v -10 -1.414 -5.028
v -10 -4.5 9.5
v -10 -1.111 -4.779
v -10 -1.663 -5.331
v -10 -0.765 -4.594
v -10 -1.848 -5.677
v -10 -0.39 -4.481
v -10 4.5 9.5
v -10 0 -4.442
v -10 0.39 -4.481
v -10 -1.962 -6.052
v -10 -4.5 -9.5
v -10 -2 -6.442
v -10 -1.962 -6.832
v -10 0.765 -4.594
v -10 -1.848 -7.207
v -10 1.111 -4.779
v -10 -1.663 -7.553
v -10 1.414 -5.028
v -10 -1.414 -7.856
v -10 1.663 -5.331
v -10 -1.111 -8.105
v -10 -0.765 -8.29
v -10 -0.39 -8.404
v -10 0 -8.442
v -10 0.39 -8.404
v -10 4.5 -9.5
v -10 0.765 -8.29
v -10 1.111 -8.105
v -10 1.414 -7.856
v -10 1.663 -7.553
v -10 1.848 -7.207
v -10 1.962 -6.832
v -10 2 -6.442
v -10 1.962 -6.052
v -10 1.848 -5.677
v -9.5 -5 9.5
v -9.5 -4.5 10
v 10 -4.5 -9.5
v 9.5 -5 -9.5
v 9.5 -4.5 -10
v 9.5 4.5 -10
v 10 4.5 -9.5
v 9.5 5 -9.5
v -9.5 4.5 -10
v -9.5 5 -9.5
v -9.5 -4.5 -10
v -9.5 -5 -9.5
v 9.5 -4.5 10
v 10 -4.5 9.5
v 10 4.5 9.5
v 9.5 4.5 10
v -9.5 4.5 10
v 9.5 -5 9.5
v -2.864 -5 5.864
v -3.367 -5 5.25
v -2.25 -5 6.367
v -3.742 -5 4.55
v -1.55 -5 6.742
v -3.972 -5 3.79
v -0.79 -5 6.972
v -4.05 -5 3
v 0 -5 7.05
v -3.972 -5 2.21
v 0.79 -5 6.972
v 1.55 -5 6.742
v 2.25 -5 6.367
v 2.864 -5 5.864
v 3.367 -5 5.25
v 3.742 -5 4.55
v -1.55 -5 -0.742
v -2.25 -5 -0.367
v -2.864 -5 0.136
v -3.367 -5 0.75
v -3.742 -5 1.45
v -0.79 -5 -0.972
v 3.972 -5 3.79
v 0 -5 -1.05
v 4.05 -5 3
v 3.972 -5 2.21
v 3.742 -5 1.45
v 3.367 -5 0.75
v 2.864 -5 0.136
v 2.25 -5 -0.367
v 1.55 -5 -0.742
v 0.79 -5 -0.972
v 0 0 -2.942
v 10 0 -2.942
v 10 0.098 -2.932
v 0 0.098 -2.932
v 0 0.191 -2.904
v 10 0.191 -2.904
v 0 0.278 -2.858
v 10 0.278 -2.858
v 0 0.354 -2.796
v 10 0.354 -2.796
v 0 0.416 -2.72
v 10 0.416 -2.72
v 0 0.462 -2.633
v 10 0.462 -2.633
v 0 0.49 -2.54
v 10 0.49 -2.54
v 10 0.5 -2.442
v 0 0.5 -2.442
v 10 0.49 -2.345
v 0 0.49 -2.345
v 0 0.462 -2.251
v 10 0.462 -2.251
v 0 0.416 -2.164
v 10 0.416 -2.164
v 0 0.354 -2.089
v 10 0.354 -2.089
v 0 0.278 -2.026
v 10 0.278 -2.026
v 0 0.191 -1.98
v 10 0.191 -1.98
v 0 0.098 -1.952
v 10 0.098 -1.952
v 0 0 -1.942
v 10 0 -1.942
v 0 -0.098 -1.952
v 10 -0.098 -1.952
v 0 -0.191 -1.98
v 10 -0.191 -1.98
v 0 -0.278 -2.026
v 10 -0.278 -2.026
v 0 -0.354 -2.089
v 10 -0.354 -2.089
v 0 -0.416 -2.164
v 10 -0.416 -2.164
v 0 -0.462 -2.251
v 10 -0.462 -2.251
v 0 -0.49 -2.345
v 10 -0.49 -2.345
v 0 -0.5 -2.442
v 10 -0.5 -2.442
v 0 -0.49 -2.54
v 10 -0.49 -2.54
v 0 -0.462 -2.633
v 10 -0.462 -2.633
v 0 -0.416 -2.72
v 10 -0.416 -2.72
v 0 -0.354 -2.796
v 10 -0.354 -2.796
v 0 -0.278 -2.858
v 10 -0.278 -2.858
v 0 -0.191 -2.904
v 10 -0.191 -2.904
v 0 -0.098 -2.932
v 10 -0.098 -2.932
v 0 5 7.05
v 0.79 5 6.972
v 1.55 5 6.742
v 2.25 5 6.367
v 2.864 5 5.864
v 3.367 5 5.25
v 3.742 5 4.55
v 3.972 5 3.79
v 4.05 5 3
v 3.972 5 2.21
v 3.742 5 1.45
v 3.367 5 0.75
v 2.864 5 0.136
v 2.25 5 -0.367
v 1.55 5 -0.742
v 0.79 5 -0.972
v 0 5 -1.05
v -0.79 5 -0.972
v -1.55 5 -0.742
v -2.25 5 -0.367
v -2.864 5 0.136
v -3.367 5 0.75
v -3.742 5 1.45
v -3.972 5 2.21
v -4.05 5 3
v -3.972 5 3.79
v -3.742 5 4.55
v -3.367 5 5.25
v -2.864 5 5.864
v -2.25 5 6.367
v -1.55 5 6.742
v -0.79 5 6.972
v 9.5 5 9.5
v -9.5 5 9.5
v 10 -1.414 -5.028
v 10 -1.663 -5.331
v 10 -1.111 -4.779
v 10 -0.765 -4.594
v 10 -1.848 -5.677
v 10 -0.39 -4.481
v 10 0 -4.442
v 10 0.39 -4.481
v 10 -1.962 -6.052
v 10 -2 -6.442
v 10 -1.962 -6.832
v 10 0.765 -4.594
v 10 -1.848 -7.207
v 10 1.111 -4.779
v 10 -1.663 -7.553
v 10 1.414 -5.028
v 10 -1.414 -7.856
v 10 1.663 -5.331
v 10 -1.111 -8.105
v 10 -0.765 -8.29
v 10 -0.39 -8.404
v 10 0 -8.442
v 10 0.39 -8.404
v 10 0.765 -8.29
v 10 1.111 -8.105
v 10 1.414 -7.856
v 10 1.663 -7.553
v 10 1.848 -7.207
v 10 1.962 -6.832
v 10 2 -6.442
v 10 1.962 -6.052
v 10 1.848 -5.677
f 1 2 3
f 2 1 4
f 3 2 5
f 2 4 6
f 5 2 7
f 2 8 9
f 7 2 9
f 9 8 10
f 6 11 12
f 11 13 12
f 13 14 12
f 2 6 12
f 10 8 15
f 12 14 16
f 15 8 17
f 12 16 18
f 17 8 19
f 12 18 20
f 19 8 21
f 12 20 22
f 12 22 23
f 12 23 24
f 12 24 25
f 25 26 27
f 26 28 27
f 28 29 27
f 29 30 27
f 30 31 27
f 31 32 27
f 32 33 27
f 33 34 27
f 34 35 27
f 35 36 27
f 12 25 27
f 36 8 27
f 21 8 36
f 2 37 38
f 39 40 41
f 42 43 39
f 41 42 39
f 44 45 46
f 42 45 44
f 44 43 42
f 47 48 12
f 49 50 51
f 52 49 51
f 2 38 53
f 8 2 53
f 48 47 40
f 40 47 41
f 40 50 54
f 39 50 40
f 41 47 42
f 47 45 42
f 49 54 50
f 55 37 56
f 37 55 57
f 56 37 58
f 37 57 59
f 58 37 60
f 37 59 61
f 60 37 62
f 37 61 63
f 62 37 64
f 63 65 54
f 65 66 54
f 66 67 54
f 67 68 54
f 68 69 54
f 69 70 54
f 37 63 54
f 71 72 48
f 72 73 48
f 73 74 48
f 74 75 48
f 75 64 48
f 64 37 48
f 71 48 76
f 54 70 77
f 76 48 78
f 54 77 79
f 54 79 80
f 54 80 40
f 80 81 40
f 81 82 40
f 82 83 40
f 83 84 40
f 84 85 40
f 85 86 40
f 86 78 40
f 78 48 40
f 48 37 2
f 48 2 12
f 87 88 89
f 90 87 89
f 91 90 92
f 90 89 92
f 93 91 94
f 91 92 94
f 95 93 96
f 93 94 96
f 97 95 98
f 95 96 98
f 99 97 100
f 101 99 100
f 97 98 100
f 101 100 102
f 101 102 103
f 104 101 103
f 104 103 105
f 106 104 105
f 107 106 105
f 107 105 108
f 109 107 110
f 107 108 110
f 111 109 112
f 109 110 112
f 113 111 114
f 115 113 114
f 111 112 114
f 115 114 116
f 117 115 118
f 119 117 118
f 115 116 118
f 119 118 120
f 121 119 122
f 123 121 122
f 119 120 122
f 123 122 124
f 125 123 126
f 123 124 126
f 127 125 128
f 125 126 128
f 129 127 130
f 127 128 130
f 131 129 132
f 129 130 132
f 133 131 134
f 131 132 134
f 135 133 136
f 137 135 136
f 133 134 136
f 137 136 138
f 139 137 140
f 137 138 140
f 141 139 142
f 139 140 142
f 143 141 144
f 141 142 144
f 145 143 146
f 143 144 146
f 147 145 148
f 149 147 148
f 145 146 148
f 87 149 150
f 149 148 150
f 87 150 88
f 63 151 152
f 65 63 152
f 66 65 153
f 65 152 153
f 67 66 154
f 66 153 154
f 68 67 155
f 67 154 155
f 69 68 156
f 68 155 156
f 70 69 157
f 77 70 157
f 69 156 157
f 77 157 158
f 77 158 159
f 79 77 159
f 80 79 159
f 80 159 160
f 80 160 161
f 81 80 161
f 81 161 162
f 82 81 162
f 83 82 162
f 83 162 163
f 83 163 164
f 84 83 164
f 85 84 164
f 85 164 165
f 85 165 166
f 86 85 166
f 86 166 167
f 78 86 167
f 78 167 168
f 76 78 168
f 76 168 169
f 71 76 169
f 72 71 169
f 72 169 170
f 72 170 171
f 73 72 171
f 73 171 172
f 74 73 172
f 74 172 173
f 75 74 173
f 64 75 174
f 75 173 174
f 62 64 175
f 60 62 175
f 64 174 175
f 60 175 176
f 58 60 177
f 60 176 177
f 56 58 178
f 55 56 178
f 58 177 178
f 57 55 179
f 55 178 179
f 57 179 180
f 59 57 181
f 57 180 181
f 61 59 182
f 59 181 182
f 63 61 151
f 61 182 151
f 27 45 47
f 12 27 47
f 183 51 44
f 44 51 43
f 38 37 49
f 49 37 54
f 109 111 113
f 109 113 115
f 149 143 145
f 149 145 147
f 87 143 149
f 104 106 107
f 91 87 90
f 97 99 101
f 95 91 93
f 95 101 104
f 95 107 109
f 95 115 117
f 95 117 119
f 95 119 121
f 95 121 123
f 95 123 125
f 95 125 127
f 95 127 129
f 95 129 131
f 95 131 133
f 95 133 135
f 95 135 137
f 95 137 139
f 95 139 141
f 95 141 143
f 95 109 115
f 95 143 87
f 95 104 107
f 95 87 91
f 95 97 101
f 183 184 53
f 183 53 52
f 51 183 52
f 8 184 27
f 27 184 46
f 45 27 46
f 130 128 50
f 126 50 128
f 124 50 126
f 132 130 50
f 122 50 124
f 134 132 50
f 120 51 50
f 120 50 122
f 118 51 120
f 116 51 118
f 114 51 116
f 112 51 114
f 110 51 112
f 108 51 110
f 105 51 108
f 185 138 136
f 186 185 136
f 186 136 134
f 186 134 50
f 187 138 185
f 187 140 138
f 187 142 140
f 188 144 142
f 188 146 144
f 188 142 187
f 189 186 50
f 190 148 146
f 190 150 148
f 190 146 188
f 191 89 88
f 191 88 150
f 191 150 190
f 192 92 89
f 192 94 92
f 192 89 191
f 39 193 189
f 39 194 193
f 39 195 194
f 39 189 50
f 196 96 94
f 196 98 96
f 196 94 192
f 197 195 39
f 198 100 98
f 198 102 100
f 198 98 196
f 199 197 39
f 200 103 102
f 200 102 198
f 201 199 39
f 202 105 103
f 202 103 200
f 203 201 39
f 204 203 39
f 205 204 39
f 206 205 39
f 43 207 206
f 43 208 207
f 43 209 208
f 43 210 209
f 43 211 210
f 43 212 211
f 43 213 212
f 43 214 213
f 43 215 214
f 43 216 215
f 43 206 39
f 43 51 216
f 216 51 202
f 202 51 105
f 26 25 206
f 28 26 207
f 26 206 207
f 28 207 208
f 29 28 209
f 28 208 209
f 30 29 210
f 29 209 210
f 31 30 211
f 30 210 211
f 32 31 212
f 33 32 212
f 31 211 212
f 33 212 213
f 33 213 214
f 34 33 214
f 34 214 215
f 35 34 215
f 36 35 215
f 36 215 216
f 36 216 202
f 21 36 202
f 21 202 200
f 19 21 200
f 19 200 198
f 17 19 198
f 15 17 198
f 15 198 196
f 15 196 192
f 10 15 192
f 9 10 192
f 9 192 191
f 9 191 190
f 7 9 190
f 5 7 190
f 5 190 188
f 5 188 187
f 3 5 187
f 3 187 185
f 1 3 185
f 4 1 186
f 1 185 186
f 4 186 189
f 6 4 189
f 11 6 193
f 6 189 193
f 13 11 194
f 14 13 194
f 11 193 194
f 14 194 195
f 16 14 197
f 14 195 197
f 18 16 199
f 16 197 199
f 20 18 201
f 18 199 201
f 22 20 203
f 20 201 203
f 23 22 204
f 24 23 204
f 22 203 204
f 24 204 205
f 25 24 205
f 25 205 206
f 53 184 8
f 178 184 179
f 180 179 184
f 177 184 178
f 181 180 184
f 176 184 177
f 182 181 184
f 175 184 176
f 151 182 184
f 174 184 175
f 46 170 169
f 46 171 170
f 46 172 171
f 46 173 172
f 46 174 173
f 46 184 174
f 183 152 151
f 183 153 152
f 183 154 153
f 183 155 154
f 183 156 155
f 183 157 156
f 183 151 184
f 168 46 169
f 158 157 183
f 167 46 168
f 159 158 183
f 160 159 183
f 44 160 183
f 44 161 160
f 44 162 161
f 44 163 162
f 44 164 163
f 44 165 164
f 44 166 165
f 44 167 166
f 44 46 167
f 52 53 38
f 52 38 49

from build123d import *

# Parameters (mm, degrees)
SKETCH1_W           = 20
SKETCH1_H           = 20
BOSS_EXTRUDE1_DEPTH = 5
SKETCH2_R           = 4.05
CUT_EXTRUDE1_DEPTH  = 18.320508076
SKETCH3_R           = 2
CUT_EXTRUDE2_DEPTH  = 23.912878475
SKETCH4_R           = 0.5
CUT_EXTRUDE3_DEPTH  = 10
CHAMFER1_SIZE       = 0.5


with BuildPart() as part:
    # Sketch1 → Boss-Extrude1 (new, symmetric)
    with BuildSketch(Plane(origin=(0, 0, 0), x_dir=(1, 0, 0), z_dir=(0, 1, 0))):
        Rectangle(SKETCH1_W, SKETCH1_H)
    extrude(amount=BOSS_EXTRUDE1_DEPTH, both=True)

    # Sketch2 → Cut-Extrude1 (cut, through all)
    with BuildSketch(Plane(origin=(0, 5, 0), x_dir=(1, 0, 0), z_dir=(0, 1, 0))):
        with Locations(Location((0, -3, 0), (0, 0, 270))):
            Circle(SKETCH2_R)
    extrude(amount=-CUT_EXTRUDE1_DEPTH, mode=Mode.SUBTRACT)

    # Sketch3 → Cut-Extrude2 (cut, through all)
    with BuildSketch(Plane(origin=(10, 0, 0), x_dir=(0, 0, -1), z_dir=(1, 0, 0))):
        with Locations((6.442090049, 0)):
            Circle(SKETCH3_R)
    extrude(amount=-CUT_EXTRUDE2_DEPTH, mode=Mode.SUBTRACT)

    # Sketch4 → Cut-Extrude3 (cut)
    with BuildSketch(Plane(origin=(10, 0, 0), x_dir=(0, 0, -1), z_dir=(1, 0, 0))):
        with Locations((2.442090049, 0)):
            Circle(SKETCH4_R)
    extrude(amount=-CUT_EXTRUDE3_DEPTH, mode=Mode.SUBTRACT)

    # Chamfer1
    chamfer1_edges = [part.edges().sort_by_distance(p)[0] for p in [
        (-10, 5, 0),
        (0, 5, 10),
        (10, 5, 0),
        (0, -5, 10),
        (-10, -5, 0),
        (0, -5, -10),
        (10, -5, 0),
        (10, 0, 10),
        (-10, 0, 10),
        (-10, 0, -10),
        (10, 0, -10),
        (0, 5, -10),
    ]]
    chamfer(chamfer1_edges, length=CHAMFER1_SIZE)


solid = part.part
